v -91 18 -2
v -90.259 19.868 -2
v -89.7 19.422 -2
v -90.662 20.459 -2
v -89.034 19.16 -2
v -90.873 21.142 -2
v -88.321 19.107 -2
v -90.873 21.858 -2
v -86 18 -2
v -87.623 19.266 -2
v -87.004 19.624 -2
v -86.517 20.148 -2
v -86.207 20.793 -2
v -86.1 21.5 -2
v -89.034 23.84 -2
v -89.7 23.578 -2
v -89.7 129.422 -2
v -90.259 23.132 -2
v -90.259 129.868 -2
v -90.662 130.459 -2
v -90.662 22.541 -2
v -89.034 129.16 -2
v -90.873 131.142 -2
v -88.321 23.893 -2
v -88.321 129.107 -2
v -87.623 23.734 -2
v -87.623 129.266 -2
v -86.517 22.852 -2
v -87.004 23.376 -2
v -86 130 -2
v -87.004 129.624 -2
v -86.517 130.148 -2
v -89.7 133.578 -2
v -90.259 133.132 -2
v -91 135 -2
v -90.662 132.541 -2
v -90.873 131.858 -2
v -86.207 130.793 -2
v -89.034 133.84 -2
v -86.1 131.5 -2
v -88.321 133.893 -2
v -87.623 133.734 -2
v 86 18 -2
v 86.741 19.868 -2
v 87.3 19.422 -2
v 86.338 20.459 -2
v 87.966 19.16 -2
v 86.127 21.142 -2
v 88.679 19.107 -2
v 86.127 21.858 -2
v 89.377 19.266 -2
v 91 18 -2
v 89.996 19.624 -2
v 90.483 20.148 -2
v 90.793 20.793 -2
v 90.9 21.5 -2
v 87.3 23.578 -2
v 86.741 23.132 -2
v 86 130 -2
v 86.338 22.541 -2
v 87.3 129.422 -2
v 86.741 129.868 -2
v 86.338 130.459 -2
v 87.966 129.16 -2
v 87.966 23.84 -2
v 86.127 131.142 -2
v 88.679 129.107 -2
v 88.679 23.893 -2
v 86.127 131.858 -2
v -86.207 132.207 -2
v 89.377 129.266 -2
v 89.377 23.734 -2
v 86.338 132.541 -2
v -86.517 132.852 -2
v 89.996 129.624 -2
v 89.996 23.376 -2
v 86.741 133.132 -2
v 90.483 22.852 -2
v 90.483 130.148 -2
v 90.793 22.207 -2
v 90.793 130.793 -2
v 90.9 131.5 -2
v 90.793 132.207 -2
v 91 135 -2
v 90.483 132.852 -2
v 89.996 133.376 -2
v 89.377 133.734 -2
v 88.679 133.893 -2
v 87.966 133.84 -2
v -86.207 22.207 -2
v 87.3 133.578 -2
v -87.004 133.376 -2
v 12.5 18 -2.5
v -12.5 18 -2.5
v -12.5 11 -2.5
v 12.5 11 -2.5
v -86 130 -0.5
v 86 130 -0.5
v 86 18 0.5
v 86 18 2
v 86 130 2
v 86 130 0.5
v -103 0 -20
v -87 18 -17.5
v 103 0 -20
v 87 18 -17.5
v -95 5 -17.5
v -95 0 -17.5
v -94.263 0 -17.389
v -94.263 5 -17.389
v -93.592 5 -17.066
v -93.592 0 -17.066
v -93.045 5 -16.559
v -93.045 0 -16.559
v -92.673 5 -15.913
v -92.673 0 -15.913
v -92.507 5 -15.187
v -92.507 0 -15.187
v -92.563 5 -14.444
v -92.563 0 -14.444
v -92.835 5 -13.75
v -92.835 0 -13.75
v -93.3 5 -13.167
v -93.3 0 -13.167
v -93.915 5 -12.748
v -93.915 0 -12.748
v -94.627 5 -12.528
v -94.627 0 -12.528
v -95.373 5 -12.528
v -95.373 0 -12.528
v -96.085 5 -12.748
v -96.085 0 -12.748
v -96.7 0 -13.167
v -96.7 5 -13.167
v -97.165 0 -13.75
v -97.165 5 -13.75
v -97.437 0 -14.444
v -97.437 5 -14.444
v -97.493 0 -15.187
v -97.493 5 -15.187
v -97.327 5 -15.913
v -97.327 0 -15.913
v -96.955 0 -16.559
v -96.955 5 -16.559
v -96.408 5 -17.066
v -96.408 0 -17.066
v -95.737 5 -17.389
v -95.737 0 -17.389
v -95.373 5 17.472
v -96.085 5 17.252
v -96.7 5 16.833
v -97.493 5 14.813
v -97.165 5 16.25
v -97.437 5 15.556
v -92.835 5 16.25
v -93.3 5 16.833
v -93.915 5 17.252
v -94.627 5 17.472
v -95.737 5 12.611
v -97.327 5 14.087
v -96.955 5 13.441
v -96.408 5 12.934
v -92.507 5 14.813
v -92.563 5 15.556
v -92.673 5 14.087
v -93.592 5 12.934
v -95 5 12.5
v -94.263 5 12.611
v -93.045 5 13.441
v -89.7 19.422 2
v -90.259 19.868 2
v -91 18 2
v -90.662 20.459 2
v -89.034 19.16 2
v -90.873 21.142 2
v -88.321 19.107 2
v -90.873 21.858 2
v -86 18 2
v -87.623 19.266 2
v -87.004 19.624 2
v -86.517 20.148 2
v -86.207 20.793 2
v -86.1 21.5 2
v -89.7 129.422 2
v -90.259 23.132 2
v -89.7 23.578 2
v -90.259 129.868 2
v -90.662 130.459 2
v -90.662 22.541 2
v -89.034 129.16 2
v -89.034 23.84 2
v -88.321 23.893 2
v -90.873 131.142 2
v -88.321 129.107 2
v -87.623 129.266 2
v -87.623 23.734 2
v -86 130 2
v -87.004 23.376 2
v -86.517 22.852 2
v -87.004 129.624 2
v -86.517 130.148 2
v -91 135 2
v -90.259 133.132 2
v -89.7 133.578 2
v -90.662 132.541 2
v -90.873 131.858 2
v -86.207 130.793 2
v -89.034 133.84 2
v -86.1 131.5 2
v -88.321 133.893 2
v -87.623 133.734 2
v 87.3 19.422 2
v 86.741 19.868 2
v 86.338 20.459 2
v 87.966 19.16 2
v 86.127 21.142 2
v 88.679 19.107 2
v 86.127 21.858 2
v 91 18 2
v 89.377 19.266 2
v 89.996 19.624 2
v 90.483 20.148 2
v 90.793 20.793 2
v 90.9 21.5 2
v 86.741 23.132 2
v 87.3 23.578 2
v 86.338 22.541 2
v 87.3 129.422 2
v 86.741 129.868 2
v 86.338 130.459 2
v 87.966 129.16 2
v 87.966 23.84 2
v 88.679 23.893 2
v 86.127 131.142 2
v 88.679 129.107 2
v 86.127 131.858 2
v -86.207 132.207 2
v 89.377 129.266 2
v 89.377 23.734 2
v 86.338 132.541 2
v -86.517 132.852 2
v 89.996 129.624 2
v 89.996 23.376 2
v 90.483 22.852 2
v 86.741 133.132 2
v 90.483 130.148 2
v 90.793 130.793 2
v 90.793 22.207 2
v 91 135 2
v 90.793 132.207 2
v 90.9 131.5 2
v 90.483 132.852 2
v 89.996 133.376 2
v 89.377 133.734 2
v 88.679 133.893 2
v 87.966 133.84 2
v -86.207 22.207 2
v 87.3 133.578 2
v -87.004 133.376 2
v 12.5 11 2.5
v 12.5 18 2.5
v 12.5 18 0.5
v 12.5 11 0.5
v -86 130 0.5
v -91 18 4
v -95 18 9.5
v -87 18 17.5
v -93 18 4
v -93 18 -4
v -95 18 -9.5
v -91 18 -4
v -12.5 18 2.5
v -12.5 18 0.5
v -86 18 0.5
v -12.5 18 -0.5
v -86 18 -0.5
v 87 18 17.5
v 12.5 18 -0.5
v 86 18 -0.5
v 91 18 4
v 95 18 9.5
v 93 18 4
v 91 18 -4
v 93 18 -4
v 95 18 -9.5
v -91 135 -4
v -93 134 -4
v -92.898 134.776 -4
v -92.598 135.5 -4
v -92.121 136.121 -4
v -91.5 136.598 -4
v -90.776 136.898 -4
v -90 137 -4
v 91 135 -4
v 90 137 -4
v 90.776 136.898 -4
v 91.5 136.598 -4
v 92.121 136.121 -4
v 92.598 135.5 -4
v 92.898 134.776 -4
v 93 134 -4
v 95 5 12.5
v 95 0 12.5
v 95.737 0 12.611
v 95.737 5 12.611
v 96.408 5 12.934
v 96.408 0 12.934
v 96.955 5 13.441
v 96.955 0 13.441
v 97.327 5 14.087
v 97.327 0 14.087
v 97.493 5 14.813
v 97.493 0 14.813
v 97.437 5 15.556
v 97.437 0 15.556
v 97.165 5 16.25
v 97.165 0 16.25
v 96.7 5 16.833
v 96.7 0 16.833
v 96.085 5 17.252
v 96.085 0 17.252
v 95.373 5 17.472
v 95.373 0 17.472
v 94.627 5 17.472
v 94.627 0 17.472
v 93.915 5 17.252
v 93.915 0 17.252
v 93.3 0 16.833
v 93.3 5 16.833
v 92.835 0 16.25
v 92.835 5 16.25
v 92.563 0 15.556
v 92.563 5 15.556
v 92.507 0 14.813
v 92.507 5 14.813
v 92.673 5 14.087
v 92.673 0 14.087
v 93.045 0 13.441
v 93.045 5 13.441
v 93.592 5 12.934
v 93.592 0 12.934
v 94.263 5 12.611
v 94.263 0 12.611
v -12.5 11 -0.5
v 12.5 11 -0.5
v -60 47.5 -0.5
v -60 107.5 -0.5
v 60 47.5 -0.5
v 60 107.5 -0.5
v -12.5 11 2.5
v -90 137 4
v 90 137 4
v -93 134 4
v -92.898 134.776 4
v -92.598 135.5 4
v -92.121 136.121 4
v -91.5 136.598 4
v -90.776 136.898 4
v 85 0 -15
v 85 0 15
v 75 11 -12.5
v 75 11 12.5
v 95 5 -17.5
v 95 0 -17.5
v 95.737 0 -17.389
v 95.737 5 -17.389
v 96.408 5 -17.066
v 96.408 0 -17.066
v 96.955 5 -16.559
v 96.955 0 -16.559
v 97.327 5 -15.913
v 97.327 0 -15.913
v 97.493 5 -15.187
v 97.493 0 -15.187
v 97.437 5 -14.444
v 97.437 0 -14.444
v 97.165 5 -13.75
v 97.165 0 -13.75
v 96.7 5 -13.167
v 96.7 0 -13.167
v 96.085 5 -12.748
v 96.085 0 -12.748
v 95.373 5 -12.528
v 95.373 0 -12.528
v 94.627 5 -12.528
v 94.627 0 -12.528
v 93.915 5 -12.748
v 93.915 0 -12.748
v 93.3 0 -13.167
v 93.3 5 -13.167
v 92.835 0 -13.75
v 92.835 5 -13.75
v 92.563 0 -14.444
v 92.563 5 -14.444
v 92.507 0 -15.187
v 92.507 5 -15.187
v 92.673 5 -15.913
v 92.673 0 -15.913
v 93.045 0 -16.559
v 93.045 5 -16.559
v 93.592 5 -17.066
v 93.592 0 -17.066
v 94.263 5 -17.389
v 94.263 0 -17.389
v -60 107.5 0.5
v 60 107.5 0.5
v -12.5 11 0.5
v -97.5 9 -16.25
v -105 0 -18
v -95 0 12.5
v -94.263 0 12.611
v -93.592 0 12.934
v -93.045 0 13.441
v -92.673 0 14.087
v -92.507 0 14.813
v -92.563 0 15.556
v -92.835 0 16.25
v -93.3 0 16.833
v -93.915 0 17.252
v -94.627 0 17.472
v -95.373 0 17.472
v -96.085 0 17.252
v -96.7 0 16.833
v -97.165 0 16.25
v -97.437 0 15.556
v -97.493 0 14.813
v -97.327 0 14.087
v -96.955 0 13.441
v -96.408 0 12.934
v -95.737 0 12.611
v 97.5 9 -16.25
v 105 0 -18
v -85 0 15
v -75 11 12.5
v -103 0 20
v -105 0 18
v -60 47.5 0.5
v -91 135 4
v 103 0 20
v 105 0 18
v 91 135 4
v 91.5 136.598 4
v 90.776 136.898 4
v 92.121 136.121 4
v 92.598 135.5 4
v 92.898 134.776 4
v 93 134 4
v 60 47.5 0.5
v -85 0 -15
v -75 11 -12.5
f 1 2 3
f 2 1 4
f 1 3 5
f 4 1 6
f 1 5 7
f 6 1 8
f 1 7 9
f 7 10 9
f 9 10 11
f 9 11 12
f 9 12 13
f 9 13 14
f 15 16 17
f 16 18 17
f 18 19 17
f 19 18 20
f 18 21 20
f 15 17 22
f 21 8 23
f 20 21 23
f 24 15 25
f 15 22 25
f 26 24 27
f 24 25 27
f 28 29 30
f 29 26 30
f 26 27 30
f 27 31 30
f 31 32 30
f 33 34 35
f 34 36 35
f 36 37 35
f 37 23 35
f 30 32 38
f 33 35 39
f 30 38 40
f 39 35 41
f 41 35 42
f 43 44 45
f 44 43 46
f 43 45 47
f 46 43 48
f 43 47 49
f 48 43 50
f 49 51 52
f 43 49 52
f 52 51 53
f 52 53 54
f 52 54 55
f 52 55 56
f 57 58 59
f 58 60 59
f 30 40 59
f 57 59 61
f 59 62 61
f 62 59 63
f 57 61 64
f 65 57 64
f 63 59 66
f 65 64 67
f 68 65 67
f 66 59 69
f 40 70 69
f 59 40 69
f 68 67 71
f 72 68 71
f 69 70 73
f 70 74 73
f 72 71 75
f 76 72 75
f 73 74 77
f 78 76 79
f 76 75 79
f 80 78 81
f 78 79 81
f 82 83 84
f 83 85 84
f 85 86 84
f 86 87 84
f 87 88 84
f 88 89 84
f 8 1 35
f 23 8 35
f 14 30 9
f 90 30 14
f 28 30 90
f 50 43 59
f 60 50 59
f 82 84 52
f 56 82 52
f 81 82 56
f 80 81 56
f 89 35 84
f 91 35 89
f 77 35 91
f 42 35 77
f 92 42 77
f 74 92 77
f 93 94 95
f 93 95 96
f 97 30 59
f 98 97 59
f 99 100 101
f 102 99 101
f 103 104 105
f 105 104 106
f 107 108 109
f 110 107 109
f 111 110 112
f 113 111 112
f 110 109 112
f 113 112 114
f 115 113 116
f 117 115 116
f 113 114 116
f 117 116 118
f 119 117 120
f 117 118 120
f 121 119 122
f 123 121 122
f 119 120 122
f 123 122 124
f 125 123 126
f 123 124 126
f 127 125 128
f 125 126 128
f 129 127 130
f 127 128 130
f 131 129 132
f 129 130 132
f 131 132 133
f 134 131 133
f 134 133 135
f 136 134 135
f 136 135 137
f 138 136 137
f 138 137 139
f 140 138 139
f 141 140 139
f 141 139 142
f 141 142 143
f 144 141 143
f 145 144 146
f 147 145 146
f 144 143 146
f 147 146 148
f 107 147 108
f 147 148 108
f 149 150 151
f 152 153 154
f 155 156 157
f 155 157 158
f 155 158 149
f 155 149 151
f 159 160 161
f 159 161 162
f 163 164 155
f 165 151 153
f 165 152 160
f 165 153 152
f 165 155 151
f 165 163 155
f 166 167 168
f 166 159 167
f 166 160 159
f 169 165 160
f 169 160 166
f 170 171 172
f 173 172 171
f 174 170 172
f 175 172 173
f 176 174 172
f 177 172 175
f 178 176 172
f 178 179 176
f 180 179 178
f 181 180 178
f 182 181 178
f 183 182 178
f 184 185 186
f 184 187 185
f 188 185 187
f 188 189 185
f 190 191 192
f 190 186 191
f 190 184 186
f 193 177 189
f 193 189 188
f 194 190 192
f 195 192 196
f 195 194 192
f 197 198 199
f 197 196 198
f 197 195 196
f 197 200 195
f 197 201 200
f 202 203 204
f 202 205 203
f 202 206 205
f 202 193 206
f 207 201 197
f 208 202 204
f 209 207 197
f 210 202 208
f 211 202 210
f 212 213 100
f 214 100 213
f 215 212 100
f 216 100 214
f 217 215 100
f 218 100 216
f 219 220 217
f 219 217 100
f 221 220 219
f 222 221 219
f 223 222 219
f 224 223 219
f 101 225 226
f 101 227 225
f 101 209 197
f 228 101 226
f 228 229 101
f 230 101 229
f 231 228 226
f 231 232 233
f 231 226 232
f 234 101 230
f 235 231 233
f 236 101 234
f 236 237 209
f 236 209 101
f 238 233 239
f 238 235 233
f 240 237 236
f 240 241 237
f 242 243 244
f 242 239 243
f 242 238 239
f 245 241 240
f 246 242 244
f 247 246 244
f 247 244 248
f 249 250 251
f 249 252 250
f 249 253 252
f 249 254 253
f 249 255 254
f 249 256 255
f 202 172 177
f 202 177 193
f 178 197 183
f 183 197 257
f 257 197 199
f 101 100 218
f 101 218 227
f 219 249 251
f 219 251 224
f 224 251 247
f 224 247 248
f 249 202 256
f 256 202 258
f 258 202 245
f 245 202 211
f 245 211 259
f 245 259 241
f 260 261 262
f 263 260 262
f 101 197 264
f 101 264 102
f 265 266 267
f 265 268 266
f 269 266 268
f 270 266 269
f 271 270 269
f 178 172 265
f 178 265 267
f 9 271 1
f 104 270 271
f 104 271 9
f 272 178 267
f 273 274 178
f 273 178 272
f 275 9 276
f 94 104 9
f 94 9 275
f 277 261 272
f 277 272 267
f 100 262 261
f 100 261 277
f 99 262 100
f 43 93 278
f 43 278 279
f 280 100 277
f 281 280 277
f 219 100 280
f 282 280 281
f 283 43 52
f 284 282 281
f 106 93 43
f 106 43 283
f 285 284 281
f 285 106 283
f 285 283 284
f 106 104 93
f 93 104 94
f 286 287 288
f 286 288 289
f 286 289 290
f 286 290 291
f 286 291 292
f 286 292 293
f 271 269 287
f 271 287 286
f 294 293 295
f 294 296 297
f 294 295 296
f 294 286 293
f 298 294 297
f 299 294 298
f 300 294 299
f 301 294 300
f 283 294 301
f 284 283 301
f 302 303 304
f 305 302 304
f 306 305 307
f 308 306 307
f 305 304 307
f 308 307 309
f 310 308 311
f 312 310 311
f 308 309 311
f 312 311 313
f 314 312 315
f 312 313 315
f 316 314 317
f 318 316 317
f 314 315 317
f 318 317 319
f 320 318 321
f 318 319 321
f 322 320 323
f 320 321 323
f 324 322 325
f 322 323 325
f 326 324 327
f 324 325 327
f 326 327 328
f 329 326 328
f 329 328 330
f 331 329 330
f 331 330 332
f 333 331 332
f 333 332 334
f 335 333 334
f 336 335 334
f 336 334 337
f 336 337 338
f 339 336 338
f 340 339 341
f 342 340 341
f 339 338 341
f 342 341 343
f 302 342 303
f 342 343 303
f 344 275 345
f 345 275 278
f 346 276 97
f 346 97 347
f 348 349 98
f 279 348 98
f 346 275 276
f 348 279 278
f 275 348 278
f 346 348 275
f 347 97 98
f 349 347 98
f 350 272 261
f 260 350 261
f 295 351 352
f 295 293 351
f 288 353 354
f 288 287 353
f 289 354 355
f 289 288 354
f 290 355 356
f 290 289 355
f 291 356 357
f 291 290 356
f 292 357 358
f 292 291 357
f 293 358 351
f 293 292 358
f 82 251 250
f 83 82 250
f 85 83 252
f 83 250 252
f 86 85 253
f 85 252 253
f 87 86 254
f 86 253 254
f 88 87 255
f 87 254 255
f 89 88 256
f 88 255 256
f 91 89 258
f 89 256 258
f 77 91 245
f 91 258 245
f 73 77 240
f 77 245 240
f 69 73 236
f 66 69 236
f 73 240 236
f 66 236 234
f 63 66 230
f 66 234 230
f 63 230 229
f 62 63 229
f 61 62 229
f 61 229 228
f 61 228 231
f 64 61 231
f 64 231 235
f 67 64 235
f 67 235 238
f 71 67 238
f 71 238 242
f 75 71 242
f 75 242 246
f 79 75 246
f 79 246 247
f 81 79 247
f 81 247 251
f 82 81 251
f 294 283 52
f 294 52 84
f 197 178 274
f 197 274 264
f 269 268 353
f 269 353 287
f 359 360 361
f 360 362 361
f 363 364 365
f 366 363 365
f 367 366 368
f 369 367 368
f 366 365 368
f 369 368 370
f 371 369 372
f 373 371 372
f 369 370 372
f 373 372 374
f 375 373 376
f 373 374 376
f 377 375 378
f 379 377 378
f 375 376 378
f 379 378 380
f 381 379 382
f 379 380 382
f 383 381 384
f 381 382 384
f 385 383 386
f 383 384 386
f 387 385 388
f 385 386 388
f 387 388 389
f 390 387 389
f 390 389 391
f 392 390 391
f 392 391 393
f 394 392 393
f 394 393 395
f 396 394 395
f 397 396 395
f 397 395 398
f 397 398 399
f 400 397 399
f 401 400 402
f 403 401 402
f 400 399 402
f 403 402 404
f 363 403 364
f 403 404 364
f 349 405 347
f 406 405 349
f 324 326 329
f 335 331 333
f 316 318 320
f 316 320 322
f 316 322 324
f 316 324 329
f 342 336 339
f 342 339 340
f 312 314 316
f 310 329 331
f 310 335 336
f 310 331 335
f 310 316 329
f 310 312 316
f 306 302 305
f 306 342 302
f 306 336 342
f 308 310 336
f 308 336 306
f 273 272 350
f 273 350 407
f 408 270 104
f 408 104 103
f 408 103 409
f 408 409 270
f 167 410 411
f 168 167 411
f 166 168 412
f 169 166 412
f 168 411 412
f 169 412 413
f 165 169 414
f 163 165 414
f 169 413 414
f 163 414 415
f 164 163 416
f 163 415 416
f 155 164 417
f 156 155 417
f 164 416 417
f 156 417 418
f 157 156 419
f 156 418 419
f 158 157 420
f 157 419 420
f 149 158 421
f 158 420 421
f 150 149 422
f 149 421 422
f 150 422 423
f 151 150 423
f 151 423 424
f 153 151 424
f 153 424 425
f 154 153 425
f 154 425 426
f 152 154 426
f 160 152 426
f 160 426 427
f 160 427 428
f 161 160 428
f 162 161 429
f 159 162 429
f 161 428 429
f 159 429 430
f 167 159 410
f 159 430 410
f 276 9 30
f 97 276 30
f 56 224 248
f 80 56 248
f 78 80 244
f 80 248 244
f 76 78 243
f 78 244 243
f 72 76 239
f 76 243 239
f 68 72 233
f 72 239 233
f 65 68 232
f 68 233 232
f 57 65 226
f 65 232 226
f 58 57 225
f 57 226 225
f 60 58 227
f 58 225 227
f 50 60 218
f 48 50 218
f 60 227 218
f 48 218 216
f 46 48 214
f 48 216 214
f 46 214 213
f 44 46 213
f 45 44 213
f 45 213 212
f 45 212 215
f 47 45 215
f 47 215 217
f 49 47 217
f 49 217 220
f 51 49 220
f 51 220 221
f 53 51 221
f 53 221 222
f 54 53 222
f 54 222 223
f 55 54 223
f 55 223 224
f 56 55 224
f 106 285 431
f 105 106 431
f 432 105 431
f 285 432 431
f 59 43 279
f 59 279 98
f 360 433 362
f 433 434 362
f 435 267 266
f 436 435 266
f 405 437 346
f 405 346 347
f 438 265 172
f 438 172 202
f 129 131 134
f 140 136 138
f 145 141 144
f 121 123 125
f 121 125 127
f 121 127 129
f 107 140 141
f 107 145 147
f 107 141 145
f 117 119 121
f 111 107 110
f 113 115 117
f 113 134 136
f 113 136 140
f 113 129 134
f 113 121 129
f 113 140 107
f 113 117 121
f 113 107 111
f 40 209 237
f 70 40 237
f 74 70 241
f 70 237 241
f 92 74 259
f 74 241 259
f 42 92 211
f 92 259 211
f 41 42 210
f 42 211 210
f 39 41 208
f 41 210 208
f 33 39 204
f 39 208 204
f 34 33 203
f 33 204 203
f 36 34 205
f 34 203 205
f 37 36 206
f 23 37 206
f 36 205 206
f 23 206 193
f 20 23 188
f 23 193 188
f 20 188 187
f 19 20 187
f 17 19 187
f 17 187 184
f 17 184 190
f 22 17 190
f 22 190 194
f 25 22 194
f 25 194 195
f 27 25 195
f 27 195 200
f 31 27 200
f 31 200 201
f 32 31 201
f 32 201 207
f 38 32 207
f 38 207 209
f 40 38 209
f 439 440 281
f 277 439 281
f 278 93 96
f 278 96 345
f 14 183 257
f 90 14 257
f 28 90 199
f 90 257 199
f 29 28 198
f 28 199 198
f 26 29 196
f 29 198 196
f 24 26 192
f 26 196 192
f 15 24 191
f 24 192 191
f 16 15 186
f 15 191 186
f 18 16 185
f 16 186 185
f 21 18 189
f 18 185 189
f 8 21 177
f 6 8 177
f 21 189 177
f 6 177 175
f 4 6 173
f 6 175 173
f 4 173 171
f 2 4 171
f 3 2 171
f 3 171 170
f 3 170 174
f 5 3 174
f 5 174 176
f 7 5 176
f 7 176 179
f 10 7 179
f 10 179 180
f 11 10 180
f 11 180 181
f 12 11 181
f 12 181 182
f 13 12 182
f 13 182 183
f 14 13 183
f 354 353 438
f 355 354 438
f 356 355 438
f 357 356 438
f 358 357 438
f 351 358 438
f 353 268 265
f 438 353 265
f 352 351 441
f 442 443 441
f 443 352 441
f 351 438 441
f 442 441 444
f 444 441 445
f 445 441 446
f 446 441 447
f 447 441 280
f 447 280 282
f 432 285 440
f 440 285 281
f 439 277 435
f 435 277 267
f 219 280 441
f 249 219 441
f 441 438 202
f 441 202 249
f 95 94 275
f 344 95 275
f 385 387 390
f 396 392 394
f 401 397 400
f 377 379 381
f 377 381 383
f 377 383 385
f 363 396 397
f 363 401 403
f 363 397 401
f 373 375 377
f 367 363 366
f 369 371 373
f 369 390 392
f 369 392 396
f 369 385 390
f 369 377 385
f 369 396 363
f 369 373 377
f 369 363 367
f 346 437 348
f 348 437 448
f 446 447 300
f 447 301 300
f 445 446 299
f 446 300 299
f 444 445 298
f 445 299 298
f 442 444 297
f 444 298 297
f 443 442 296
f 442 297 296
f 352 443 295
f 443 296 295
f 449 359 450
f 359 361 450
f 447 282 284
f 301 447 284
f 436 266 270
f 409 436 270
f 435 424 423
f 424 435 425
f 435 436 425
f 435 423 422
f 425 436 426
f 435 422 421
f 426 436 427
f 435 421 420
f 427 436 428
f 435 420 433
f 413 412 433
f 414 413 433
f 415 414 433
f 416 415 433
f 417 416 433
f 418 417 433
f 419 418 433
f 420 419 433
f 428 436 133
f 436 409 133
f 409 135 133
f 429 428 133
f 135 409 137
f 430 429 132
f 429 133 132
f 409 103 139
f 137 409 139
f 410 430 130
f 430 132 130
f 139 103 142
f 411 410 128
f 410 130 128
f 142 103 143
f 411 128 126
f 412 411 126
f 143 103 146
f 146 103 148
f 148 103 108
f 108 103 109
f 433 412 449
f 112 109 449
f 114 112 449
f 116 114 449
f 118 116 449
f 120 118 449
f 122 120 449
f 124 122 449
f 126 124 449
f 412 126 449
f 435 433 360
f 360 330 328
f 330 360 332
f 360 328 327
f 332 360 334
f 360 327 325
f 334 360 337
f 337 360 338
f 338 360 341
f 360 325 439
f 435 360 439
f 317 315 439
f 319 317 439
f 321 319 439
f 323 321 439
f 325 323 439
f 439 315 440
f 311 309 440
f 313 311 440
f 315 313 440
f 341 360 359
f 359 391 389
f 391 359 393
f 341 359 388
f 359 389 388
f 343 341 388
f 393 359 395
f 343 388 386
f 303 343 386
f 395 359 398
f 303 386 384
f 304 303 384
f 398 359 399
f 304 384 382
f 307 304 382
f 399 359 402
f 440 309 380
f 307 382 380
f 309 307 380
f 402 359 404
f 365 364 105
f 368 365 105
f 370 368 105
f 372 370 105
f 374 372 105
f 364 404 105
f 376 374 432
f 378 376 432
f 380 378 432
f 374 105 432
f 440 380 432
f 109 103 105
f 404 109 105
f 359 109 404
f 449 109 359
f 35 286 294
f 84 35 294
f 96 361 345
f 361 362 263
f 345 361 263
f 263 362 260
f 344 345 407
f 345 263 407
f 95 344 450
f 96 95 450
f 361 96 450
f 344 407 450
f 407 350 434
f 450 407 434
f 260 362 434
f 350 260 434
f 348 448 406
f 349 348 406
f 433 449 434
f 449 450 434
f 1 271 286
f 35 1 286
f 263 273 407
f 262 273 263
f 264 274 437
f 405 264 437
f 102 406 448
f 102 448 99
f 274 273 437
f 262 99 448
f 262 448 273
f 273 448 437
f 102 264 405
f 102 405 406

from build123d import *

# Parameters (mm, degrees)
SKETCH_3_W          = 186
SKETCH_3_H          = 8
EXTRUDE_1_DEPTH     = 119
SKETCH_9_R          = 2.5
CUT_EXTRUDE_1_DEPTH = 5
SKETCH_10_W         = 172
SKETCH_10_H         = 112
CUT_EXTRUDE_2_DEPTH = 3.5
SKETCH_11_W         = 120
SKETCH_11_H         = 60
CUT_EXTRUDE_3_DEPTH = 10
SKETCH_12_W         = 182
SKETCH_12_H         = 117
CUT_EXTRUDE_4_DEPTH = 2
SKETCH_15_W         = 25
SKETCH_15_H         = 2
CUT_EXTRUDE_8_DEPTH = 12
SKETCH_13_R         = 2.4
CUT_EXTRUDE_7_DEPTH = 12
MIRROR_START        = -14.334518618
MIRROR_3_DEPTH      = 20.078011551
FILLET_1_R          = 3


# Read off the part's stored shape, not the designer's step: 镜向3
with BuildPart() as part:
    # 草图1 → 放样1 section 0
    with BuildSketch(Plane(origin=(0, 0, 0), x_dir=(1, 0, 0), z_dir=(0, 1, 0))):
        with BuildLine():
            Line((-105, 20), (105, 20))
            Line((105, 20), (105, -20))
            Line((105, -20), (-105, -20))
            Line((-105, -20), (-105, 20))
        make_face()
    # 草图2 → 放样1 section 1
    with BuildSketch(Plane(origin=(0, 18, 0), x_dir=(1, 0, 0), z_dir=(0, 1, 0))):
        with BuildLine():
            Line((-95, 17.5), (95, 17.5))
            Line((95, 17.5), (95, -17.5))
            Line((95, -17.5), (-95, -17.5))
            Line((-95, -17.5), (-95, 17.5))
        make_face()
    loft()

    # 草图3 → 凸台-拉伸1 (add)
    with BuildSketch(Plane(origin=(0, 18, 0), x_dir=(1, 0, 0), z_dir=(0, 1, 0))):
        Rectangle(SKETCH_3_W, SKETCH_3_H)
    extrude(amount=EXTRUDE_1_DEPTH)

    # 草图5 → 切除-放样2 section 0
    with BuildSketch(Plane.XZ):
        with BuildLine():
            Line((-85, 15), (85, 15))
            Line((85, 15), (85, -15))
            Line((85, -15), (-85, -15))
            Line((-85, -15), (-85, 15))
        make_face()
    # 草图7 → 切除-放样2 section 1
    with BuildSketch(Plane(origin=(0, 11, 0), x_dir=(1, 0, 0), z_dir=(0, 1, 0))):
        with BuildLine():
            Line((-75, 12.5), (75, 12.5))
            Line((75, 12.5), (75, -12.5))
            Line((75, -12.5), (-75, -12.5))
            Line((-75, -12.5), (-75, 12.5))
        make_face()
    loft(mode=Mode.SUBTRACT)

    # 草图9 → 切除-拉伸1 (cut)
    with BuildSketch(Plane.XZ):
        with Locations(Location((95, 15, 0), (0, 0, 270))):
            Circle(SKETCH_9_R)
        with Locations(Location((-95, 15, 0), (0, 0, 270))):
            Circle(SKETCH_9_R)
        with Locations(Location((-95, -15, 0), (0, 0, 270))):
            Circle(SKETCH_9_R)
        with Locations(Location((95, -15, 0), (0, 0, 270))):
            Circle(SKETCH_9_R)
    extrude(amount=-CUT_EXTRUDE_1_DEPTH, mode=Mode.SUBTRACT)

    # 草图10 → 切除-拉伸2 (cut)
    with BuildSketch(Plane.XY.offset(4)):
        with Locations((0, 74)):
            Rectangle(SKETCH_10_W, SKETCH_10_H)
    cut_extrude_2 = extrude(amount=-CUT_EXTRUDE_2_DEPTH, mode=Mode.SUBTRACT)

    # 草图11 → 切除-拉伸3 (cut)
    with BuildSketch(Plane.XY.offset(0.5)):
        with Locations((0, 77.5)):
            Rectangle(SKETCH_11_W, SKETCH_11_H)
    extrude(amount=-CUT_EXTRUDE_3_DEPTH, mode=Mode.SUBTRACT)

    # 草图12 → 切除-拉伸4 (cut)
    with BuildSketch(Plane.XY.offset(4)):
        with Locations((0, 76.5)):
            Rectangle(SKETCH_12_W, SKETCH_12_H)
    cut_extrude_4 = extrude(amount=-CUT_EXTRUDE_4_DEPTH, mode=Mode.SUBTRACT)

    # 草图15 → 切除-拉伸8 (cut)
    with BuildSketch(Plane(origin=(0, 18, 0), x_dir=(1, 0, 0), z_dir=(0, 1, 0))):
        with Locations((0, -1.5)):
            Rectangle(SKETCH_15_W, SKETCH_15_H)
    cut_extrude_8 = extrude(amount=-CUT_EXTRUDE_8_DEPTH, mode=Mode.SUBTRACT)

    # 镜向1: 切除-拉伸2, 切除-拉伸4, 切除-拉伸8 across plane
    add(cut_extrude_2.mirror(Plane.XY), mode=Mode.SUBTRACT)
    add(cut_extrude_4.mirror(Plane.XY), mode=Mode.SUBTRACT)
    add(cut_extrude_8.mirror(Plane.XY), mode=Mode.SUBTRACT)

    # 草图13 → 切除-拉伸7 (cut)
    with BuildSketch(Plane.XY.offset(2)):
        with Locations((88.5, 131.5)):
            Circle(SKETCH_13_R)
        with Locations((88.5, 21.5)):
            Circle(SKETCH_13_R)
        with Locations((-88.5, 21.5)):
            Circle(SKETCH_13_R)
        with Locations((-88.5, 131.5)):
            Circle(SKETCH_13_R)
    extrude(amount=-CUT_EXTRUDE_7_DEPTH, mode=Mode.SUBTRACT)

    # 草图17 → 切除-放样3 section 0
    with BuildSketch(Plane(origin=(0, 18, 0), x_dir=(1, 0, 0), z_dir=(0, 1, 0))):
        with BuildLine():
            Line((87, 17.5), (95, 17.5))
            Line((95, 17.5), (95, 9.5))
            Line((95, 9.5), (87, 17.5))
        make_face()
    # 草图18 → 切除-放样3 section 1
    with BuildSketch(Plane(origin=(0, 0, 0), x_dir=(1, 0, 0), z_dir=(0, 1, 0))):
        with BuildLine():
            Line((103, 20), (105, 20))
            Line((105, 20), (105, 18))
            Line((105, 18), (103, 20))
        make_face()
    loft_3 = loft(mode=Mode.SUBTRACT)

    # 镜向2: 切除-放样3 across plane
    add(loft_3.mirror(Plane(origin=(0, 0, 0), x_dir=(0, 0, 1), z_dir=(1, 0, 0))), mode=Mode.SUBTRACT)

    # 镜向3 outline → 镜向3 (cut)
    with BuildSketch(Plane(origin=(0, 0, 0), x_dir=(1, 0, 0), z_dir=(0, 0.6973549598034537, -0.7167259309091051)).offset(MIRROR_START)):
        Polygon((-84.282271503, -27), (-87, -25.104778553), (-105, -12.552389276), (-106, -11.855034316), (-106, -27), align=None)
        Polygon((87, -25.104778553), (84.282271503, -27), (106, -27), (106, -11.855034316), (105, -12.552389276), align=None)
    extrude(amount=MIRROR_3_DEPTH, mode=Mode.SUBTRACT)

    # 圆角1
    fillet_1_edges = [part.edges().sort_by_distance(p)[0] for p in [
        (93, 137, 0),
        (-93, 137, 0),
    ]]
    fillet(fillet_1_edges, radius=FILLET_1_R)


solid = part.part
